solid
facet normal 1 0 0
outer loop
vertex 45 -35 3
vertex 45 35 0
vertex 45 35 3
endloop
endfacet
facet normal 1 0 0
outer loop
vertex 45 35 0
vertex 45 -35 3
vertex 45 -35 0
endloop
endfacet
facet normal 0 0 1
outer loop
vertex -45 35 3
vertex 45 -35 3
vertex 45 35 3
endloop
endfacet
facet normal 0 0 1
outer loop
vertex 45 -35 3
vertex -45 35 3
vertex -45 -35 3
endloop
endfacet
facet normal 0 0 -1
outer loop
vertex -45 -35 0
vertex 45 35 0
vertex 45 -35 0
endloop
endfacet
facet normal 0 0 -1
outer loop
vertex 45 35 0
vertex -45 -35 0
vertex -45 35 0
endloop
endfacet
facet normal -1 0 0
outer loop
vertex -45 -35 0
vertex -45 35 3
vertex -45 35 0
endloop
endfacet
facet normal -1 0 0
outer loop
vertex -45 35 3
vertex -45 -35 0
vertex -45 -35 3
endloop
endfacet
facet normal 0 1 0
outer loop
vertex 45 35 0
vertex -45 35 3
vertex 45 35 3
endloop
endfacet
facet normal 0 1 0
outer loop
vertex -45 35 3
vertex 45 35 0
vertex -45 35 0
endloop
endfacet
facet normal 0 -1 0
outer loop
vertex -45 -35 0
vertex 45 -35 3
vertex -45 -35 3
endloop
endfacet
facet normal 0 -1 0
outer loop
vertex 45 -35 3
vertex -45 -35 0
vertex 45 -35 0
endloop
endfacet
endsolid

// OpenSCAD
// Lithophane — backlit image panel
// Image is passed as a grayscale .dat heightmap (values 0.0-1.0, inverted: 0=bright/thin, 1=dark/thick)
//
// Print tip: orient vertically, use 100% infill, white/natural PLA, backlight with LED strip.

width     = 90;    // total panel width (mm)
height    = 70;    // total panel height (mm)
min_thick = 0.6;   // thinnest point — bright pixels (mm)
max_thick = 3.0;   // thickest point — dark pixels (mm)
border    = 3.0;   // frame border width (mm); set 0 for no frame

dat_file  = "";    // path to .dat heightmap (set by app)
dat_w     = 100;   // pixel columns in dat_file
dat_h     = 75;    // pixel rows in dat_file

$fa = 3; $fs = 0.5;

inner_w = width  - 2 * border;
inner_h = height - 2 * border;

thick_range = max_thick - min_thick;

module litho_surface() {
    // surface() reads 0.0-1.0 values → scale z to thick_range, offset by min_thick
    translate([-inner_w/2, -inner_h/2, min_thick])
    scale([inner_w / max(1, dat_w - 1),
           inner_h / max(1, dat_h - 1),
           thick_range])
    surface(file = dat_file, center = false, convexity = 15);
}

module base_fill() {
    // Solid slab that closes the bottom below the surface mesh
    translate([0, 0, min_thick / 2])
    cube([inner_w, inner_h, min_thick], center = true);
}

module frame() {
    if (border > 0) {
        difference() {
            cube([width, height, max_thick], center = true);
            cube([inner_w, inner_h, max_thick + 0.01], center = true);
        }
    }
}

// Main
translate([0, 0, max_thick / 2]) {
    if (dat_file != "") {
        base_fill();
        litho_surface();
    } else {
        // Placeholder slab when no image is loaded
        cube([inner_w, inner_h, max_thick], center = true);
    }
    frame();
}
